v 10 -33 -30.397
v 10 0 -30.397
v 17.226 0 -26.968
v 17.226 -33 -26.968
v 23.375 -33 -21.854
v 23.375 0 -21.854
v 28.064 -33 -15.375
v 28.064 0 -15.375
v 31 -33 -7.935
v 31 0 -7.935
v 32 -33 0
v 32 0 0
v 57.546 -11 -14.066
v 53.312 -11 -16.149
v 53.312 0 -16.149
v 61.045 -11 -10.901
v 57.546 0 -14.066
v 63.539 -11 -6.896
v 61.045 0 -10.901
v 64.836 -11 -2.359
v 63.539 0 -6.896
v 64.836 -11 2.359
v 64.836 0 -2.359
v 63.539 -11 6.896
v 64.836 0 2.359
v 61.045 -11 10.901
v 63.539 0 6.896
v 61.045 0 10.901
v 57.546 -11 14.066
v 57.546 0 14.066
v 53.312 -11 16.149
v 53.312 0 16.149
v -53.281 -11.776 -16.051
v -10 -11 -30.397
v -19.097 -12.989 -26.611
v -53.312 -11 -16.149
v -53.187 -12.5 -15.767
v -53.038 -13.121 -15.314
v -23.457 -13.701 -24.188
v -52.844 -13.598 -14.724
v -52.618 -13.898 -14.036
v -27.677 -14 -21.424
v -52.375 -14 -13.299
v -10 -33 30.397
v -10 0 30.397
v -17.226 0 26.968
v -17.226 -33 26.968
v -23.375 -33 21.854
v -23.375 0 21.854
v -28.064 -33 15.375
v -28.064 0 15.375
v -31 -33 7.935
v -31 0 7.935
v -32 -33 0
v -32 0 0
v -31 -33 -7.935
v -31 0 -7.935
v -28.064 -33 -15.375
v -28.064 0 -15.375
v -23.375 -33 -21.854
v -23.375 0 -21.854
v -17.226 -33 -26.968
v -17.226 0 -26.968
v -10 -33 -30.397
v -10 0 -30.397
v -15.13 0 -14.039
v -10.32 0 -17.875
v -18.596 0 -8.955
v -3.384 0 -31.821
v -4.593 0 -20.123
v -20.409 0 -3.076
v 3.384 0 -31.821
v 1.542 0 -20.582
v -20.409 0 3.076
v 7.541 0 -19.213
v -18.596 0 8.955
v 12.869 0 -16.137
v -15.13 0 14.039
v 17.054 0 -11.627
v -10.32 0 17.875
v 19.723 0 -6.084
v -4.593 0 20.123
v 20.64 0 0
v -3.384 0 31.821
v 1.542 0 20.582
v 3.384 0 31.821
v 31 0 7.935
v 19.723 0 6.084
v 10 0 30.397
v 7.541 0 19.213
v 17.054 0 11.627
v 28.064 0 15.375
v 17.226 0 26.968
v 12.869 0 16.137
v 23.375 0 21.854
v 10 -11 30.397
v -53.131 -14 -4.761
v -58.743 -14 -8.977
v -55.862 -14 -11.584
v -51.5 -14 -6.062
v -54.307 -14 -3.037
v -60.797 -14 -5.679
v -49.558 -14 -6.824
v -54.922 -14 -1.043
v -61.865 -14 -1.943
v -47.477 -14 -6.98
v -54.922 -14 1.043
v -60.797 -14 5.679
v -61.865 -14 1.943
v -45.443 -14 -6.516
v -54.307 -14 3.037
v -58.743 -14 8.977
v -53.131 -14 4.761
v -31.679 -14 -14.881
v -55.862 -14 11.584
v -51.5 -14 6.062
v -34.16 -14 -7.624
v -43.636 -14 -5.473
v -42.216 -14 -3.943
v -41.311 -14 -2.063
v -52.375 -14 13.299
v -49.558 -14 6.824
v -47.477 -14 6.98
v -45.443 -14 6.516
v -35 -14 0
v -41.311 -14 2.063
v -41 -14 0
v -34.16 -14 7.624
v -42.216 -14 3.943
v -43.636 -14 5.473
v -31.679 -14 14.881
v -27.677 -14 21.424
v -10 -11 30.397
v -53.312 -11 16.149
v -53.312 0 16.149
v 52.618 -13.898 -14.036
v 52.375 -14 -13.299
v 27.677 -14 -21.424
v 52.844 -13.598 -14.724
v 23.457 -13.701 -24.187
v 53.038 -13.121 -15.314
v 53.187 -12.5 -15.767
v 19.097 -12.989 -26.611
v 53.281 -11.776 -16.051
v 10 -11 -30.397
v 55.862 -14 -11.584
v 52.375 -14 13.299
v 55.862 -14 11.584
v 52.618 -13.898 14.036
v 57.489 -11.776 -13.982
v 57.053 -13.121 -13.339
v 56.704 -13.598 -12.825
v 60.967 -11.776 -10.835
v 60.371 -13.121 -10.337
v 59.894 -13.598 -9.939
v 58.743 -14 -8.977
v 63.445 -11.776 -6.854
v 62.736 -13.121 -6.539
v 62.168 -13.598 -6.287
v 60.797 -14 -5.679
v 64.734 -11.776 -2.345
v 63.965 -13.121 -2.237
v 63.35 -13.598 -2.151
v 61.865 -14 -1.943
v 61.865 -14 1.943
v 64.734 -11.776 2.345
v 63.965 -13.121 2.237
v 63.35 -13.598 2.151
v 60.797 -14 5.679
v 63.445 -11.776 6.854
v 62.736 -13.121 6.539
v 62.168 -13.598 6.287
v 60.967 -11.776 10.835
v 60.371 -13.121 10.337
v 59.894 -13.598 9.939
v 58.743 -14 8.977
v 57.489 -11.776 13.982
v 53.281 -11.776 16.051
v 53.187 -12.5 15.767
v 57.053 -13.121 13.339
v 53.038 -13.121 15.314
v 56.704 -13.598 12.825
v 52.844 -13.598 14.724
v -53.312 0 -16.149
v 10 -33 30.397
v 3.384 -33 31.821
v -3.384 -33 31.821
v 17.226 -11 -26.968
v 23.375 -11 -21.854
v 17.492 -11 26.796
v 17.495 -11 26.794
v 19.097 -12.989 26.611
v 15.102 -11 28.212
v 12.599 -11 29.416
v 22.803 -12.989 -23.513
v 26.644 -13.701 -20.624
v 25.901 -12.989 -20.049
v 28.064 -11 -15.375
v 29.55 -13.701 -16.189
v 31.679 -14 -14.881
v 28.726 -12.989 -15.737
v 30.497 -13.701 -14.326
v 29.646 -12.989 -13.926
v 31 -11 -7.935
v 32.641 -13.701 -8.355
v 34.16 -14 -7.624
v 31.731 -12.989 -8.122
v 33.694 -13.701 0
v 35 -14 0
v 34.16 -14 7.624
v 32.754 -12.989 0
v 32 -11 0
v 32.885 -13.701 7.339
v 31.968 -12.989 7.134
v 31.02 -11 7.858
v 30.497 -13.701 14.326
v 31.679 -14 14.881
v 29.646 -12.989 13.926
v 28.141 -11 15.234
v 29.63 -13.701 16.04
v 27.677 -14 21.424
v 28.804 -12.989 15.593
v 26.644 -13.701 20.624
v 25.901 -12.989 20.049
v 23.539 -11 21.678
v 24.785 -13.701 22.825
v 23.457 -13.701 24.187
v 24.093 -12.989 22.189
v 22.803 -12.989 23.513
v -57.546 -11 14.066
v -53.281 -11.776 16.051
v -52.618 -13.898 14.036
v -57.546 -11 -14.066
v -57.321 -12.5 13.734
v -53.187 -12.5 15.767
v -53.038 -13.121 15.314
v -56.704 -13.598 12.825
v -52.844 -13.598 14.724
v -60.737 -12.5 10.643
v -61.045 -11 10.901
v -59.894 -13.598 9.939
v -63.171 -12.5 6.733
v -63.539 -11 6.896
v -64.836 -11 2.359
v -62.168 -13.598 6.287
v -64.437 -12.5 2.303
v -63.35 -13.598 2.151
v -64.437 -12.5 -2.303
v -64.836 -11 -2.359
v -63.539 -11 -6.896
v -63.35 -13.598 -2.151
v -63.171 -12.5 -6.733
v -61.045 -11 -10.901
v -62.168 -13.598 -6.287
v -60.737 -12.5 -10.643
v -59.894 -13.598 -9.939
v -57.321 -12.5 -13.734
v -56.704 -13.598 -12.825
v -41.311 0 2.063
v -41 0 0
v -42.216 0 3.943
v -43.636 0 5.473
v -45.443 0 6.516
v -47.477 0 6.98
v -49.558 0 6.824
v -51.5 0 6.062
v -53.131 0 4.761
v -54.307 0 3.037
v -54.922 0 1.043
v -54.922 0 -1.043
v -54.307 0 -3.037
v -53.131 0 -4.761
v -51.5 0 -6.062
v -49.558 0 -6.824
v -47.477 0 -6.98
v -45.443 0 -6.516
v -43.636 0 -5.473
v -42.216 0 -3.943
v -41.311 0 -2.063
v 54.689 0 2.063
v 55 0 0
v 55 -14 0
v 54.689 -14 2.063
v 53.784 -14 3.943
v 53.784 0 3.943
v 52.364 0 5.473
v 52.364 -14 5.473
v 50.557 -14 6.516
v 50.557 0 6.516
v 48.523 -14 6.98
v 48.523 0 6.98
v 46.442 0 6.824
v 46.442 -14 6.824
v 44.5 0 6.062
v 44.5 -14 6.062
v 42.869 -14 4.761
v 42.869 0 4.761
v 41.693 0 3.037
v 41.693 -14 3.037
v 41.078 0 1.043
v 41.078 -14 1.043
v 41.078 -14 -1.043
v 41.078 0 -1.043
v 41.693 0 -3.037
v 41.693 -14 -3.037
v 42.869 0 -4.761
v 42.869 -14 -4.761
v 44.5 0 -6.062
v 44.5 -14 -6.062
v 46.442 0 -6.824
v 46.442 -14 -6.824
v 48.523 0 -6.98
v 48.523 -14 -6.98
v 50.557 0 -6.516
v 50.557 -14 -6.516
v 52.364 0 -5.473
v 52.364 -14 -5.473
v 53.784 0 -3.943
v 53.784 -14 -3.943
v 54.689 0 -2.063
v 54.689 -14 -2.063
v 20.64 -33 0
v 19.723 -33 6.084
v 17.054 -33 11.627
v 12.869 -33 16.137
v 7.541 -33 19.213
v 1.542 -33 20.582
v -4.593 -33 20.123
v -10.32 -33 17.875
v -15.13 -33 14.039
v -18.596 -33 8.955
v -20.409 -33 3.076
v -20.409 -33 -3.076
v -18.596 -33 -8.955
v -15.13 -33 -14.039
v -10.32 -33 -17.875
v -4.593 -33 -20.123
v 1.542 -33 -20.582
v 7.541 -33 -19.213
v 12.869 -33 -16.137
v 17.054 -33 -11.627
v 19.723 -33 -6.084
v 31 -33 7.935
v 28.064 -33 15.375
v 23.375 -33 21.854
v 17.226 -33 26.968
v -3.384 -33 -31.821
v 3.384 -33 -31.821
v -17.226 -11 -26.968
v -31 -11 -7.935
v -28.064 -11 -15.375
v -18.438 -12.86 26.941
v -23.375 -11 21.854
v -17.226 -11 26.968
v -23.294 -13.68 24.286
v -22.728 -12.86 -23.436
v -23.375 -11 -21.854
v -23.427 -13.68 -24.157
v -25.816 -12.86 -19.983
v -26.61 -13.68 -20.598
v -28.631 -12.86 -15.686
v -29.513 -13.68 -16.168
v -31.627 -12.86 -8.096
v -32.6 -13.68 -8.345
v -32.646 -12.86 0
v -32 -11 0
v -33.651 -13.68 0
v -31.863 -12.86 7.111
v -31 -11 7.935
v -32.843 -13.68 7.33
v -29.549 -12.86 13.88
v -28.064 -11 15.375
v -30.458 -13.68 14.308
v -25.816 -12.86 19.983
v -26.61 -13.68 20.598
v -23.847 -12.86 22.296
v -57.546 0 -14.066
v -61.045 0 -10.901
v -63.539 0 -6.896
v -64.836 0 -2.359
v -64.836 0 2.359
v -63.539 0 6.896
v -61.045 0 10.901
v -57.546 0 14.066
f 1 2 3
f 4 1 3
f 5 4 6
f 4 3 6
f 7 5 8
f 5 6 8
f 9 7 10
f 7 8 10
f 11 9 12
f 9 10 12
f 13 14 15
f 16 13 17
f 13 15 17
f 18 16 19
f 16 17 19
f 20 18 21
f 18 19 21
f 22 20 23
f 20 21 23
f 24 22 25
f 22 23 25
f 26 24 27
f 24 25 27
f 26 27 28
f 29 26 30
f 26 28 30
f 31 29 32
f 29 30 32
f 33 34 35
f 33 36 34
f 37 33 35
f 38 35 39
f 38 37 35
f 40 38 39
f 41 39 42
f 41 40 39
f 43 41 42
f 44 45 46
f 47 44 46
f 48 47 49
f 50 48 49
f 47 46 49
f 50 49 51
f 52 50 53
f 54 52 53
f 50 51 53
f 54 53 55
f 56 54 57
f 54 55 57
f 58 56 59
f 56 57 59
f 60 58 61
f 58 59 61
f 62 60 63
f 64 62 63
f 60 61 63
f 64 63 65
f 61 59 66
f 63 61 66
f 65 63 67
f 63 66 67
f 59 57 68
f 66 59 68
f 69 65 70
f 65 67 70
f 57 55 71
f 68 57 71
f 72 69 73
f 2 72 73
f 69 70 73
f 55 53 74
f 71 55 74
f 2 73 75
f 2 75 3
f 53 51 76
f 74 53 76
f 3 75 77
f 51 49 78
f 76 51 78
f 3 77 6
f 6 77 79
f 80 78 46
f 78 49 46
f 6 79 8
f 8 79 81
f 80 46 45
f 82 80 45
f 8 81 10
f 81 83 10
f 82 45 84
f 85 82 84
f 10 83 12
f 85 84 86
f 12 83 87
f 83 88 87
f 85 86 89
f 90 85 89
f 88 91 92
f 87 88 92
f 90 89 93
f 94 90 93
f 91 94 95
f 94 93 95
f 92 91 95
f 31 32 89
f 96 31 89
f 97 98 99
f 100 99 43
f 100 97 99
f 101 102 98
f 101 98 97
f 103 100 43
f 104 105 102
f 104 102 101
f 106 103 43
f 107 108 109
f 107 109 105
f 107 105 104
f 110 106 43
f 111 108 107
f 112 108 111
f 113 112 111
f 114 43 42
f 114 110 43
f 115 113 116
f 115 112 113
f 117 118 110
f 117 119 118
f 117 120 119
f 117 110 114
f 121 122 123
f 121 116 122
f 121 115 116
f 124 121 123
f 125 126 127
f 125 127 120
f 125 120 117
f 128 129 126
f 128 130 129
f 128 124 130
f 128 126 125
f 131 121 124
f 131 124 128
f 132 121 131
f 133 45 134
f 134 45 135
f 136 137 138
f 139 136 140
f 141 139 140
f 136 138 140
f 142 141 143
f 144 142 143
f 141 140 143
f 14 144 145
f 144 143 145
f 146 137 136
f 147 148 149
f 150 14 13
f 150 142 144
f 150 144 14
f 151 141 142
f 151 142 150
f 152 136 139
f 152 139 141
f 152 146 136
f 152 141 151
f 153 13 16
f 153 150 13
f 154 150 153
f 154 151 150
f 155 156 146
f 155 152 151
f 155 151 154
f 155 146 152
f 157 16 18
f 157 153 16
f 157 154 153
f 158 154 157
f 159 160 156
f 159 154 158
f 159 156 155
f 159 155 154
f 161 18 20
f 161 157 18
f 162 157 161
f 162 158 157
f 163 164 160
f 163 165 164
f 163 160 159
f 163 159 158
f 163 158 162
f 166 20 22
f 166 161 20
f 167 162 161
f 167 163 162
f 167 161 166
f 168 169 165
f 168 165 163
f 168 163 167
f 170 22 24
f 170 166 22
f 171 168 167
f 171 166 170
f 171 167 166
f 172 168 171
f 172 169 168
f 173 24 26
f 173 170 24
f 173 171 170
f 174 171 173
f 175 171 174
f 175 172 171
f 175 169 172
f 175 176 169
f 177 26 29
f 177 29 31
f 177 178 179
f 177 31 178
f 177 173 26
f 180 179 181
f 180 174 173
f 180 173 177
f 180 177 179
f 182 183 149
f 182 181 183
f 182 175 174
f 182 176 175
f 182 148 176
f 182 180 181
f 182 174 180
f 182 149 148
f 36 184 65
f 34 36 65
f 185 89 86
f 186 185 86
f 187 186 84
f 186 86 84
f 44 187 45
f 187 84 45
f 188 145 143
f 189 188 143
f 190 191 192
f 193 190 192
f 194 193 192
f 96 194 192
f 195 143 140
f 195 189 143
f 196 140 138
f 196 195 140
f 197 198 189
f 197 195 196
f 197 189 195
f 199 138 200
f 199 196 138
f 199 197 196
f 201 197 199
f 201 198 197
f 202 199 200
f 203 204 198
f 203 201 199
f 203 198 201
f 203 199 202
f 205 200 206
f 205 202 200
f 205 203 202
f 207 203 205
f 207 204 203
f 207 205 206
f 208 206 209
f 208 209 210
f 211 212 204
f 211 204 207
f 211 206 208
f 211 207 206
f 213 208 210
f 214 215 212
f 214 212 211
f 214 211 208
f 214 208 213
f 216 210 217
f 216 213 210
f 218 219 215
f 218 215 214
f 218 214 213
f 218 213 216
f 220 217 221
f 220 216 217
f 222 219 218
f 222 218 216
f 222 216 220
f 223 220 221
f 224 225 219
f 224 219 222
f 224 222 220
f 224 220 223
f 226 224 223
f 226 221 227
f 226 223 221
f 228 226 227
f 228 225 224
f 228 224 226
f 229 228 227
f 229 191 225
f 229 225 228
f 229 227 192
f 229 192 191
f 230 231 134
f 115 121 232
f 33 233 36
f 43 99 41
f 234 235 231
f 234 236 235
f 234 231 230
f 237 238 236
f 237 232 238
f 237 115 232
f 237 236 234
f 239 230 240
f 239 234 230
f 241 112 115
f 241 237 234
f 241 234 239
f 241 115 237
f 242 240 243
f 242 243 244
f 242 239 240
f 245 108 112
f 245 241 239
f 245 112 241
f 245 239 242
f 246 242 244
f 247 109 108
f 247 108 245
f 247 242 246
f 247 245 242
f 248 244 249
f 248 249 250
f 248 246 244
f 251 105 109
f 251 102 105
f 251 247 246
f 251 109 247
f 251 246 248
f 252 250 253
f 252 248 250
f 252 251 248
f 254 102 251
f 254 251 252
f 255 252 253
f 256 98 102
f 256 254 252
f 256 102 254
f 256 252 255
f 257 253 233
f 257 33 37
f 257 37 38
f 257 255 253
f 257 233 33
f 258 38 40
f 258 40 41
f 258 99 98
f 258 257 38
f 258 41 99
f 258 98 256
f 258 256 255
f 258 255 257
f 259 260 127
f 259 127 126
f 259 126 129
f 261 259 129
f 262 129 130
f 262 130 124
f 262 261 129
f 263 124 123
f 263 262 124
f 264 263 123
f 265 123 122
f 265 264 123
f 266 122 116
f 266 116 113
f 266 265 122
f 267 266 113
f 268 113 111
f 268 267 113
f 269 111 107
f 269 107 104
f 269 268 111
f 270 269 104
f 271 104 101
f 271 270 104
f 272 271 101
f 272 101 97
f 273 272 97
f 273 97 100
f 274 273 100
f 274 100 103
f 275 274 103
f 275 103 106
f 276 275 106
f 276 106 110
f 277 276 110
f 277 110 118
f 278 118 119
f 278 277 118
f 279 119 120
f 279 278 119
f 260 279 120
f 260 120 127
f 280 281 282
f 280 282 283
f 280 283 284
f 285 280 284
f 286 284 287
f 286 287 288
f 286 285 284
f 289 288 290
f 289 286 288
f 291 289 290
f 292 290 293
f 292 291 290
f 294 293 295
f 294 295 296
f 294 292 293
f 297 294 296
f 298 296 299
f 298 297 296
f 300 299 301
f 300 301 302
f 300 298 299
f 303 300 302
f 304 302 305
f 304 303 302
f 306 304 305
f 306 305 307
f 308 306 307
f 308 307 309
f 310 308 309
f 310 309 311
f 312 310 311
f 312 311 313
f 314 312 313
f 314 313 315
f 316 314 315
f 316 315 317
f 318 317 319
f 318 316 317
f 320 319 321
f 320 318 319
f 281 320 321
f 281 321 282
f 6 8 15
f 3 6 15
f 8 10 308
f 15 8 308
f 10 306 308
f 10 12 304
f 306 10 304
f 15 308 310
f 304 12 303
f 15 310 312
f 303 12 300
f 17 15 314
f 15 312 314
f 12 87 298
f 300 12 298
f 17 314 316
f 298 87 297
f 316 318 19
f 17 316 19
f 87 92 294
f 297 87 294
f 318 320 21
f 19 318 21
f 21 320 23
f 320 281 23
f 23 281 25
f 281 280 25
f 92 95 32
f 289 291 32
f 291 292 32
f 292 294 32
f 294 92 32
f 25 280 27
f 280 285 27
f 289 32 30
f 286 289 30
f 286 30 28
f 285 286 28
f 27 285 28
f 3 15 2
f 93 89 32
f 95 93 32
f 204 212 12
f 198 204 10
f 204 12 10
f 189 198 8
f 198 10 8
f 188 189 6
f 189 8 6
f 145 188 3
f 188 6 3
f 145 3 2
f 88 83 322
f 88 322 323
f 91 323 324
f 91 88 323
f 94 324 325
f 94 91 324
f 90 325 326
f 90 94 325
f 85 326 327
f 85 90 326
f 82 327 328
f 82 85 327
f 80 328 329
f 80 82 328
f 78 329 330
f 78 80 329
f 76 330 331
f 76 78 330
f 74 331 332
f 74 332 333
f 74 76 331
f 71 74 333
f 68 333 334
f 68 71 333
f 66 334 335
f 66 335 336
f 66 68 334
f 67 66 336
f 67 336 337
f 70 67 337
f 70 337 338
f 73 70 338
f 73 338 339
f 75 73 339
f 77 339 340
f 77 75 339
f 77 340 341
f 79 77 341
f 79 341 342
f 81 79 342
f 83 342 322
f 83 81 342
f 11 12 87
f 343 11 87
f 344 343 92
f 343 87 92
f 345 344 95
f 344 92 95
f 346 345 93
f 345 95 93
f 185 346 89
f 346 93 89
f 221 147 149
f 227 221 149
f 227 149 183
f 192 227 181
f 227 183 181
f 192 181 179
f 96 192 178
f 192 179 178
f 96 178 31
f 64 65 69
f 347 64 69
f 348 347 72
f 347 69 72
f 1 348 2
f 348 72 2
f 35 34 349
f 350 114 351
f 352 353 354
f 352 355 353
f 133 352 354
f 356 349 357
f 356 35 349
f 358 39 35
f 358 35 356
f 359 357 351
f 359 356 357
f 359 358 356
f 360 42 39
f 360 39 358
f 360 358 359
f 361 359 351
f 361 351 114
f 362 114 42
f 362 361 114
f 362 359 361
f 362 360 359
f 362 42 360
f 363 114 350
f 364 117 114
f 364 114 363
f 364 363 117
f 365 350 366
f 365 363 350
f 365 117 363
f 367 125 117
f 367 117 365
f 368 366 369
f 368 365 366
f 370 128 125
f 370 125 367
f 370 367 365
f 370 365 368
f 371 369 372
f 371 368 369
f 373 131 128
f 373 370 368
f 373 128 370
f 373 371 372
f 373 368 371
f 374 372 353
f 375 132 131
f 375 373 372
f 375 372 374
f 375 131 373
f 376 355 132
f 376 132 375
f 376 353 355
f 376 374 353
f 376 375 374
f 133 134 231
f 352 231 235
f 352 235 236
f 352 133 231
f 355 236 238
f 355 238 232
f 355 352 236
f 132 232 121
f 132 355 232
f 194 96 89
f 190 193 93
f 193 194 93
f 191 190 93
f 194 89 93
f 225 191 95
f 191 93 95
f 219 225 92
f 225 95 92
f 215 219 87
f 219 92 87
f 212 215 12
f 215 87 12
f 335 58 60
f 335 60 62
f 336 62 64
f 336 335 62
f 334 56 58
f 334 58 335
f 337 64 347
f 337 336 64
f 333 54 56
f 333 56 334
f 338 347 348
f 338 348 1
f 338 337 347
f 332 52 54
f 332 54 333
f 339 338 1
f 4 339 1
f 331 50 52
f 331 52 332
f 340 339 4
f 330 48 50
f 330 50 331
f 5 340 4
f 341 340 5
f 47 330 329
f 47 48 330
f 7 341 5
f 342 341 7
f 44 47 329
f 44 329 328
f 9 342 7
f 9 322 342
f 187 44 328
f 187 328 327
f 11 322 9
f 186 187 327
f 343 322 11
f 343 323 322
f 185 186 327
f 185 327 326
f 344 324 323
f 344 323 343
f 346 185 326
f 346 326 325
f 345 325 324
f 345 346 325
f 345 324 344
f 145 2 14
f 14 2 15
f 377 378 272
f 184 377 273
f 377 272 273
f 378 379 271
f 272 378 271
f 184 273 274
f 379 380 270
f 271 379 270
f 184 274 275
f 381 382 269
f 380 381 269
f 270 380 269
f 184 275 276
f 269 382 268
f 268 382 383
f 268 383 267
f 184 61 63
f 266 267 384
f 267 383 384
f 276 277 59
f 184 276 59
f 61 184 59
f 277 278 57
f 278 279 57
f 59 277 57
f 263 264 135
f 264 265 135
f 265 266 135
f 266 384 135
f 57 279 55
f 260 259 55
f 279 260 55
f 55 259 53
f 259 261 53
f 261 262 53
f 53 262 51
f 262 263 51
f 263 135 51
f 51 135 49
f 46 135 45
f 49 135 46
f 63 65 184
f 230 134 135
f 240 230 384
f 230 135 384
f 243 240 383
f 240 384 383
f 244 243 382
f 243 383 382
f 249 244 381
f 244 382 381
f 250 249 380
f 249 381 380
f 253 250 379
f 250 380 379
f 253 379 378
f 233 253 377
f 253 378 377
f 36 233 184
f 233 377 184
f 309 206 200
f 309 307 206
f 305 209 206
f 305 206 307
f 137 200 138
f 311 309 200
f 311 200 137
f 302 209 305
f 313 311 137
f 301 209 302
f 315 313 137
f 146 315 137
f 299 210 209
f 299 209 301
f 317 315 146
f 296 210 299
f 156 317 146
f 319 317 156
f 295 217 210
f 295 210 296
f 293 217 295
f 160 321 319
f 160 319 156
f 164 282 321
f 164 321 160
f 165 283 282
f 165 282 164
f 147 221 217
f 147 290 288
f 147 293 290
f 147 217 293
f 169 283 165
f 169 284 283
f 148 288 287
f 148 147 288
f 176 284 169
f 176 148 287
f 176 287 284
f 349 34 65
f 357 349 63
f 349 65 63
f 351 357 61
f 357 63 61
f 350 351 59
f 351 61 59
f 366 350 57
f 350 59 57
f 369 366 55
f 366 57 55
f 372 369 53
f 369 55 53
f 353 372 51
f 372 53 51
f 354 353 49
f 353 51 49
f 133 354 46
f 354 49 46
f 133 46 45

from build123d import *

# Parameters (mm, degrees)
F0_R          = 7
F1_DEPTH      = 14
F0_R_2        = 20.64
F2_DEPTH      = 33
F3_T1_DEPTH   = 68.0960524607
F3_T3_DEPTH   = 68.0960524607
F3_T6_ANGLE   = 224.2346877327
F3_T8_ANGLE   = 143.5800862714
F3_2_T1_DEPTH = 68.0960524607
F3_2_T3_DEPTH = 68.0960524607
F3_2_T6_ANGLE = 224.2346877327
F3_2_T8_ANGLE = 143.5800862714


# Not quite as in the source:
# - a fillet or chamfer that OpenCascade refuses, or shapes differently, is made with other operations: its cross-section is extruded or revolved along the edge and cut away or added


with BuildPart() as f1:
    # F0 (on Front) → F1 (new body)
    with BuildSketch(Plane.XZ):
        with BuildLine():
            ThreePointArc((-10, -30.3973683071), (-32, 0), (-10, 30.3973683071))
            Line((-10, 30.3973683071), (-53.3125, 16.1486019132))
            ThreePointArc((-53.3125, 16.1486019132), (-65, 0), (-53.3125, -16.1486019132))
            Line((-53.3125, -16.1486019132), (-10, -30.3973683071))
        make_face()
        with Locations((-48, 0)):
            Circle(F0_R, mode=Mode.SUBTRACT)
    extrude(amount=F1_DEPTH)

    # F3: fillet of radius 3 on 4 edges, made by hand

    # F3_s2 → F3_t1 (cut)
    with BuildSketch(Plane(origin=(21.373149591, 0, 7.03125), x_dir=(0, 1, 0), z_dir=(-0.9499177596, 0, -0.3125))):
        with BuildLine():
            ThreePointArc((-11, -32), (-13.1213203436, -31.1213203436), (-14, -29))
            Line((-14, -29), (-14, -32))
            Line((-14, -32), (-11, -32))
        make_face()
    extrude(amount=F3_T1_DEPTH, mode=Mode.SUBTRACT)

    # F3_s4 → F3_t3 (cut)
    with BuildSketch(Plane(origin=(-43.3125, 0, 14.248766394), x_dir=(0, 1, 0), z_dir=(0.9499177596, 0, -0.3125))):
        with BuildLine():
            ThreePointArc((-11, -32), (-13.1213203436, -31.1213203436), (-14, -29))
            Line((-14, -29), (-14, -32))
            Line((-14, -32), (-11, -32))
        make_face()
    extrude(amount=F3_T3_DEPTH, mode=Mode.SUBTRACT)

    # F3_s5 → F3_t6 (revolve, cut)
    with BuildSketch(Plane(origin=(0, 0, 0), x_dir=(0, 1, 0), z_dir=(0.9264147025, 0, 0.3765047131))):
        with BuildLine():
            ThreePointArc((-11, -32), (-13.1213203436, -32.8786796564), (-14, -35))
            Line((-14, -35), (-14, -32))
            Line((-14, -32), (-11, -32))
        make_face()
    revolve(axis=Axis((0, -14, 0), (0, 1, 0)), revolution_arc=F3_T6_ANGLE, mode=Mode.SUBTRACT)

    # F3_s7 → F3_t8 (revolve, cut)
    with BuildSketch(Plane(origin=(-43.3125, 0, -14.248766394), x_dir=(0, 1, 0), z_dir=(0.9499177596, 0, 0.3125))):
        with BuildLine():
            ThreePointArc((-11, 32), (-13.1213203436, 31.1213203436), (-14, 29))
            Line((-14, 29), (-14, 32))
            Line((-14, 32), (-11, 32))
        make_face()
    revolve(axis=Axis((-48, -14, 0), (0, -1, 0)), revolution_arc=F3_T8_ANGLE, mode=Mode.SUBTRACT)


with BuildPart() as f1b:
    # F0 (on Front) → F1, piece 2 (new body)
    with BuildSketch(Plane.XZ):
        with BuildLine():
            ThreePointArc((10, 30.3973683071), (25.9229627936, 18.7616630393), (32, 0))
            ThreePointArc((32, 0), (25.9229627936, -18.7616630393), (10, -30.3973683071))
            Line((10, -30.3973683071), (53.3125, -16.1486019132))
            ThreePointArc((53.3125, -16.1486019132), (65, 0), (53.3125, 16.1486019132))
            Line((53.3125, 16.1486019132), (10, 30.3973683071))
        make_face()
        with Locations((48, 0)):
            Circle(F0_R, mode=Mode.SUBTRACT)
    extrude(amount=F1_DEPTH)

    # F3#2: fillet of radius 3 on 4 edges, made by hand

    # F3_2_s2 → F3_2_t1 (cut)
    with BuildSketch(Plane(origin=(43.3125, 0, -14.248766394), x_dir=(0, 1, 0), z_dir=(-0.9499177596, 0, 0.3125))):
        with BuildLine():
            ThreePointArc((-14, -29), (-13.1213203436, -31.1213203436), (-11, -32))
            Line((-11, -32), (-14, -32))
            Line((-14, -32), (-14, -29))
        make_face()
    extrude(amount=F3_2_T1_DEPTH, mode=Mode.SUBTRACT)

    # F3_2_s4 → F3_2_t3 (cut)
    with BuildSketch(Plane(origin=(-21.373149591, 0, -7.03125), x_dir=(0, 1, 0), z_dir=(0.9499177596, 0, 0.3125))):
        with BuildLine():
            ThreePointArc((-14, -29), (-13.1213203436, -31.1213203436), (-11, -32))
            Line((-11, -32), (-14, -32))
            Line((-14, -32), (-14, -29))
        make_face()
    extrude(amount=F3_2_T3_DEPTH, mode=Mode.SUBTRACT)

    # F3_2_s5 → F3_2_t6 (revolve, cut)
    with BuildSketch(Plane(origin=(0, 0, 0), x_dir=(0, 1, 0), z_dir=(-0.9264147025, 0, 0.3765047131))):
        with BuildLine():
            ThreePointArc((-14, 35), (-13.1213203436, 32.8786796564), (-11, 32))
            Line((-11, 32), (-14, 32))
            Line((-14, 32), (-14, 35))
        make_face()
    revolve(axis=Axis((0, -14, 0), (0, -1, 0)), revolution_arc=F3_2_T6_ANGLE, mode=Mode.SUBTRACT)

    # F3_2_s7 → F3_2_t8 (revolve, cut)
    with BuildSketch(Plane(origin=(43.3125, 0, 14.248766394), x_dir=(0, 1, 0), z_dir=(-0.9499177596, 0, -0.3125))):
        with BuildLine():
            ThreePointArc((-11, 32), (-13.1213203436, 31.1213203436), (-14, 29))
            Line((-14, 29), (-14, 32))
            Line((-14, 32), (-11, 32))
        make_face()
    revolve(axis=Axis((48, -14, 0), (0, -1, 0)), revolution_arc=F3_2_T8_ANGLE, mode=Mode.SUBTRACT)


with BuildPart() as f2:
    # F0 (on Front) → F2 (new body)
    with BuildSketch(Plane.XZ):
        with BuildLine():
            ThreePointArc((10, -30.3973683071), (25.9229627936, -18.7616630393), (32, 0))
            ThreePointArc((32, 0), (25.9229627936, 18.7616630393), (10, 30.3973683071))
            ThreePointArc((10, 30.3973683071), (0, 32), (-10, 30.3973683071))
            ThreePointArc((-10, 30.3973683071), (-32, 0), (-10, -30.3973683071))
            ThreePointArc((-10, -30.3973683071), (0, -32), (10, -30.3973683071))
        make_face()
        Circle(F0_R_2, mode=Mode.SUBTRACT)
    extrude(amount=F2_DEPTH)


solid = Compound([f1.part, f1b.part, f2.part])
